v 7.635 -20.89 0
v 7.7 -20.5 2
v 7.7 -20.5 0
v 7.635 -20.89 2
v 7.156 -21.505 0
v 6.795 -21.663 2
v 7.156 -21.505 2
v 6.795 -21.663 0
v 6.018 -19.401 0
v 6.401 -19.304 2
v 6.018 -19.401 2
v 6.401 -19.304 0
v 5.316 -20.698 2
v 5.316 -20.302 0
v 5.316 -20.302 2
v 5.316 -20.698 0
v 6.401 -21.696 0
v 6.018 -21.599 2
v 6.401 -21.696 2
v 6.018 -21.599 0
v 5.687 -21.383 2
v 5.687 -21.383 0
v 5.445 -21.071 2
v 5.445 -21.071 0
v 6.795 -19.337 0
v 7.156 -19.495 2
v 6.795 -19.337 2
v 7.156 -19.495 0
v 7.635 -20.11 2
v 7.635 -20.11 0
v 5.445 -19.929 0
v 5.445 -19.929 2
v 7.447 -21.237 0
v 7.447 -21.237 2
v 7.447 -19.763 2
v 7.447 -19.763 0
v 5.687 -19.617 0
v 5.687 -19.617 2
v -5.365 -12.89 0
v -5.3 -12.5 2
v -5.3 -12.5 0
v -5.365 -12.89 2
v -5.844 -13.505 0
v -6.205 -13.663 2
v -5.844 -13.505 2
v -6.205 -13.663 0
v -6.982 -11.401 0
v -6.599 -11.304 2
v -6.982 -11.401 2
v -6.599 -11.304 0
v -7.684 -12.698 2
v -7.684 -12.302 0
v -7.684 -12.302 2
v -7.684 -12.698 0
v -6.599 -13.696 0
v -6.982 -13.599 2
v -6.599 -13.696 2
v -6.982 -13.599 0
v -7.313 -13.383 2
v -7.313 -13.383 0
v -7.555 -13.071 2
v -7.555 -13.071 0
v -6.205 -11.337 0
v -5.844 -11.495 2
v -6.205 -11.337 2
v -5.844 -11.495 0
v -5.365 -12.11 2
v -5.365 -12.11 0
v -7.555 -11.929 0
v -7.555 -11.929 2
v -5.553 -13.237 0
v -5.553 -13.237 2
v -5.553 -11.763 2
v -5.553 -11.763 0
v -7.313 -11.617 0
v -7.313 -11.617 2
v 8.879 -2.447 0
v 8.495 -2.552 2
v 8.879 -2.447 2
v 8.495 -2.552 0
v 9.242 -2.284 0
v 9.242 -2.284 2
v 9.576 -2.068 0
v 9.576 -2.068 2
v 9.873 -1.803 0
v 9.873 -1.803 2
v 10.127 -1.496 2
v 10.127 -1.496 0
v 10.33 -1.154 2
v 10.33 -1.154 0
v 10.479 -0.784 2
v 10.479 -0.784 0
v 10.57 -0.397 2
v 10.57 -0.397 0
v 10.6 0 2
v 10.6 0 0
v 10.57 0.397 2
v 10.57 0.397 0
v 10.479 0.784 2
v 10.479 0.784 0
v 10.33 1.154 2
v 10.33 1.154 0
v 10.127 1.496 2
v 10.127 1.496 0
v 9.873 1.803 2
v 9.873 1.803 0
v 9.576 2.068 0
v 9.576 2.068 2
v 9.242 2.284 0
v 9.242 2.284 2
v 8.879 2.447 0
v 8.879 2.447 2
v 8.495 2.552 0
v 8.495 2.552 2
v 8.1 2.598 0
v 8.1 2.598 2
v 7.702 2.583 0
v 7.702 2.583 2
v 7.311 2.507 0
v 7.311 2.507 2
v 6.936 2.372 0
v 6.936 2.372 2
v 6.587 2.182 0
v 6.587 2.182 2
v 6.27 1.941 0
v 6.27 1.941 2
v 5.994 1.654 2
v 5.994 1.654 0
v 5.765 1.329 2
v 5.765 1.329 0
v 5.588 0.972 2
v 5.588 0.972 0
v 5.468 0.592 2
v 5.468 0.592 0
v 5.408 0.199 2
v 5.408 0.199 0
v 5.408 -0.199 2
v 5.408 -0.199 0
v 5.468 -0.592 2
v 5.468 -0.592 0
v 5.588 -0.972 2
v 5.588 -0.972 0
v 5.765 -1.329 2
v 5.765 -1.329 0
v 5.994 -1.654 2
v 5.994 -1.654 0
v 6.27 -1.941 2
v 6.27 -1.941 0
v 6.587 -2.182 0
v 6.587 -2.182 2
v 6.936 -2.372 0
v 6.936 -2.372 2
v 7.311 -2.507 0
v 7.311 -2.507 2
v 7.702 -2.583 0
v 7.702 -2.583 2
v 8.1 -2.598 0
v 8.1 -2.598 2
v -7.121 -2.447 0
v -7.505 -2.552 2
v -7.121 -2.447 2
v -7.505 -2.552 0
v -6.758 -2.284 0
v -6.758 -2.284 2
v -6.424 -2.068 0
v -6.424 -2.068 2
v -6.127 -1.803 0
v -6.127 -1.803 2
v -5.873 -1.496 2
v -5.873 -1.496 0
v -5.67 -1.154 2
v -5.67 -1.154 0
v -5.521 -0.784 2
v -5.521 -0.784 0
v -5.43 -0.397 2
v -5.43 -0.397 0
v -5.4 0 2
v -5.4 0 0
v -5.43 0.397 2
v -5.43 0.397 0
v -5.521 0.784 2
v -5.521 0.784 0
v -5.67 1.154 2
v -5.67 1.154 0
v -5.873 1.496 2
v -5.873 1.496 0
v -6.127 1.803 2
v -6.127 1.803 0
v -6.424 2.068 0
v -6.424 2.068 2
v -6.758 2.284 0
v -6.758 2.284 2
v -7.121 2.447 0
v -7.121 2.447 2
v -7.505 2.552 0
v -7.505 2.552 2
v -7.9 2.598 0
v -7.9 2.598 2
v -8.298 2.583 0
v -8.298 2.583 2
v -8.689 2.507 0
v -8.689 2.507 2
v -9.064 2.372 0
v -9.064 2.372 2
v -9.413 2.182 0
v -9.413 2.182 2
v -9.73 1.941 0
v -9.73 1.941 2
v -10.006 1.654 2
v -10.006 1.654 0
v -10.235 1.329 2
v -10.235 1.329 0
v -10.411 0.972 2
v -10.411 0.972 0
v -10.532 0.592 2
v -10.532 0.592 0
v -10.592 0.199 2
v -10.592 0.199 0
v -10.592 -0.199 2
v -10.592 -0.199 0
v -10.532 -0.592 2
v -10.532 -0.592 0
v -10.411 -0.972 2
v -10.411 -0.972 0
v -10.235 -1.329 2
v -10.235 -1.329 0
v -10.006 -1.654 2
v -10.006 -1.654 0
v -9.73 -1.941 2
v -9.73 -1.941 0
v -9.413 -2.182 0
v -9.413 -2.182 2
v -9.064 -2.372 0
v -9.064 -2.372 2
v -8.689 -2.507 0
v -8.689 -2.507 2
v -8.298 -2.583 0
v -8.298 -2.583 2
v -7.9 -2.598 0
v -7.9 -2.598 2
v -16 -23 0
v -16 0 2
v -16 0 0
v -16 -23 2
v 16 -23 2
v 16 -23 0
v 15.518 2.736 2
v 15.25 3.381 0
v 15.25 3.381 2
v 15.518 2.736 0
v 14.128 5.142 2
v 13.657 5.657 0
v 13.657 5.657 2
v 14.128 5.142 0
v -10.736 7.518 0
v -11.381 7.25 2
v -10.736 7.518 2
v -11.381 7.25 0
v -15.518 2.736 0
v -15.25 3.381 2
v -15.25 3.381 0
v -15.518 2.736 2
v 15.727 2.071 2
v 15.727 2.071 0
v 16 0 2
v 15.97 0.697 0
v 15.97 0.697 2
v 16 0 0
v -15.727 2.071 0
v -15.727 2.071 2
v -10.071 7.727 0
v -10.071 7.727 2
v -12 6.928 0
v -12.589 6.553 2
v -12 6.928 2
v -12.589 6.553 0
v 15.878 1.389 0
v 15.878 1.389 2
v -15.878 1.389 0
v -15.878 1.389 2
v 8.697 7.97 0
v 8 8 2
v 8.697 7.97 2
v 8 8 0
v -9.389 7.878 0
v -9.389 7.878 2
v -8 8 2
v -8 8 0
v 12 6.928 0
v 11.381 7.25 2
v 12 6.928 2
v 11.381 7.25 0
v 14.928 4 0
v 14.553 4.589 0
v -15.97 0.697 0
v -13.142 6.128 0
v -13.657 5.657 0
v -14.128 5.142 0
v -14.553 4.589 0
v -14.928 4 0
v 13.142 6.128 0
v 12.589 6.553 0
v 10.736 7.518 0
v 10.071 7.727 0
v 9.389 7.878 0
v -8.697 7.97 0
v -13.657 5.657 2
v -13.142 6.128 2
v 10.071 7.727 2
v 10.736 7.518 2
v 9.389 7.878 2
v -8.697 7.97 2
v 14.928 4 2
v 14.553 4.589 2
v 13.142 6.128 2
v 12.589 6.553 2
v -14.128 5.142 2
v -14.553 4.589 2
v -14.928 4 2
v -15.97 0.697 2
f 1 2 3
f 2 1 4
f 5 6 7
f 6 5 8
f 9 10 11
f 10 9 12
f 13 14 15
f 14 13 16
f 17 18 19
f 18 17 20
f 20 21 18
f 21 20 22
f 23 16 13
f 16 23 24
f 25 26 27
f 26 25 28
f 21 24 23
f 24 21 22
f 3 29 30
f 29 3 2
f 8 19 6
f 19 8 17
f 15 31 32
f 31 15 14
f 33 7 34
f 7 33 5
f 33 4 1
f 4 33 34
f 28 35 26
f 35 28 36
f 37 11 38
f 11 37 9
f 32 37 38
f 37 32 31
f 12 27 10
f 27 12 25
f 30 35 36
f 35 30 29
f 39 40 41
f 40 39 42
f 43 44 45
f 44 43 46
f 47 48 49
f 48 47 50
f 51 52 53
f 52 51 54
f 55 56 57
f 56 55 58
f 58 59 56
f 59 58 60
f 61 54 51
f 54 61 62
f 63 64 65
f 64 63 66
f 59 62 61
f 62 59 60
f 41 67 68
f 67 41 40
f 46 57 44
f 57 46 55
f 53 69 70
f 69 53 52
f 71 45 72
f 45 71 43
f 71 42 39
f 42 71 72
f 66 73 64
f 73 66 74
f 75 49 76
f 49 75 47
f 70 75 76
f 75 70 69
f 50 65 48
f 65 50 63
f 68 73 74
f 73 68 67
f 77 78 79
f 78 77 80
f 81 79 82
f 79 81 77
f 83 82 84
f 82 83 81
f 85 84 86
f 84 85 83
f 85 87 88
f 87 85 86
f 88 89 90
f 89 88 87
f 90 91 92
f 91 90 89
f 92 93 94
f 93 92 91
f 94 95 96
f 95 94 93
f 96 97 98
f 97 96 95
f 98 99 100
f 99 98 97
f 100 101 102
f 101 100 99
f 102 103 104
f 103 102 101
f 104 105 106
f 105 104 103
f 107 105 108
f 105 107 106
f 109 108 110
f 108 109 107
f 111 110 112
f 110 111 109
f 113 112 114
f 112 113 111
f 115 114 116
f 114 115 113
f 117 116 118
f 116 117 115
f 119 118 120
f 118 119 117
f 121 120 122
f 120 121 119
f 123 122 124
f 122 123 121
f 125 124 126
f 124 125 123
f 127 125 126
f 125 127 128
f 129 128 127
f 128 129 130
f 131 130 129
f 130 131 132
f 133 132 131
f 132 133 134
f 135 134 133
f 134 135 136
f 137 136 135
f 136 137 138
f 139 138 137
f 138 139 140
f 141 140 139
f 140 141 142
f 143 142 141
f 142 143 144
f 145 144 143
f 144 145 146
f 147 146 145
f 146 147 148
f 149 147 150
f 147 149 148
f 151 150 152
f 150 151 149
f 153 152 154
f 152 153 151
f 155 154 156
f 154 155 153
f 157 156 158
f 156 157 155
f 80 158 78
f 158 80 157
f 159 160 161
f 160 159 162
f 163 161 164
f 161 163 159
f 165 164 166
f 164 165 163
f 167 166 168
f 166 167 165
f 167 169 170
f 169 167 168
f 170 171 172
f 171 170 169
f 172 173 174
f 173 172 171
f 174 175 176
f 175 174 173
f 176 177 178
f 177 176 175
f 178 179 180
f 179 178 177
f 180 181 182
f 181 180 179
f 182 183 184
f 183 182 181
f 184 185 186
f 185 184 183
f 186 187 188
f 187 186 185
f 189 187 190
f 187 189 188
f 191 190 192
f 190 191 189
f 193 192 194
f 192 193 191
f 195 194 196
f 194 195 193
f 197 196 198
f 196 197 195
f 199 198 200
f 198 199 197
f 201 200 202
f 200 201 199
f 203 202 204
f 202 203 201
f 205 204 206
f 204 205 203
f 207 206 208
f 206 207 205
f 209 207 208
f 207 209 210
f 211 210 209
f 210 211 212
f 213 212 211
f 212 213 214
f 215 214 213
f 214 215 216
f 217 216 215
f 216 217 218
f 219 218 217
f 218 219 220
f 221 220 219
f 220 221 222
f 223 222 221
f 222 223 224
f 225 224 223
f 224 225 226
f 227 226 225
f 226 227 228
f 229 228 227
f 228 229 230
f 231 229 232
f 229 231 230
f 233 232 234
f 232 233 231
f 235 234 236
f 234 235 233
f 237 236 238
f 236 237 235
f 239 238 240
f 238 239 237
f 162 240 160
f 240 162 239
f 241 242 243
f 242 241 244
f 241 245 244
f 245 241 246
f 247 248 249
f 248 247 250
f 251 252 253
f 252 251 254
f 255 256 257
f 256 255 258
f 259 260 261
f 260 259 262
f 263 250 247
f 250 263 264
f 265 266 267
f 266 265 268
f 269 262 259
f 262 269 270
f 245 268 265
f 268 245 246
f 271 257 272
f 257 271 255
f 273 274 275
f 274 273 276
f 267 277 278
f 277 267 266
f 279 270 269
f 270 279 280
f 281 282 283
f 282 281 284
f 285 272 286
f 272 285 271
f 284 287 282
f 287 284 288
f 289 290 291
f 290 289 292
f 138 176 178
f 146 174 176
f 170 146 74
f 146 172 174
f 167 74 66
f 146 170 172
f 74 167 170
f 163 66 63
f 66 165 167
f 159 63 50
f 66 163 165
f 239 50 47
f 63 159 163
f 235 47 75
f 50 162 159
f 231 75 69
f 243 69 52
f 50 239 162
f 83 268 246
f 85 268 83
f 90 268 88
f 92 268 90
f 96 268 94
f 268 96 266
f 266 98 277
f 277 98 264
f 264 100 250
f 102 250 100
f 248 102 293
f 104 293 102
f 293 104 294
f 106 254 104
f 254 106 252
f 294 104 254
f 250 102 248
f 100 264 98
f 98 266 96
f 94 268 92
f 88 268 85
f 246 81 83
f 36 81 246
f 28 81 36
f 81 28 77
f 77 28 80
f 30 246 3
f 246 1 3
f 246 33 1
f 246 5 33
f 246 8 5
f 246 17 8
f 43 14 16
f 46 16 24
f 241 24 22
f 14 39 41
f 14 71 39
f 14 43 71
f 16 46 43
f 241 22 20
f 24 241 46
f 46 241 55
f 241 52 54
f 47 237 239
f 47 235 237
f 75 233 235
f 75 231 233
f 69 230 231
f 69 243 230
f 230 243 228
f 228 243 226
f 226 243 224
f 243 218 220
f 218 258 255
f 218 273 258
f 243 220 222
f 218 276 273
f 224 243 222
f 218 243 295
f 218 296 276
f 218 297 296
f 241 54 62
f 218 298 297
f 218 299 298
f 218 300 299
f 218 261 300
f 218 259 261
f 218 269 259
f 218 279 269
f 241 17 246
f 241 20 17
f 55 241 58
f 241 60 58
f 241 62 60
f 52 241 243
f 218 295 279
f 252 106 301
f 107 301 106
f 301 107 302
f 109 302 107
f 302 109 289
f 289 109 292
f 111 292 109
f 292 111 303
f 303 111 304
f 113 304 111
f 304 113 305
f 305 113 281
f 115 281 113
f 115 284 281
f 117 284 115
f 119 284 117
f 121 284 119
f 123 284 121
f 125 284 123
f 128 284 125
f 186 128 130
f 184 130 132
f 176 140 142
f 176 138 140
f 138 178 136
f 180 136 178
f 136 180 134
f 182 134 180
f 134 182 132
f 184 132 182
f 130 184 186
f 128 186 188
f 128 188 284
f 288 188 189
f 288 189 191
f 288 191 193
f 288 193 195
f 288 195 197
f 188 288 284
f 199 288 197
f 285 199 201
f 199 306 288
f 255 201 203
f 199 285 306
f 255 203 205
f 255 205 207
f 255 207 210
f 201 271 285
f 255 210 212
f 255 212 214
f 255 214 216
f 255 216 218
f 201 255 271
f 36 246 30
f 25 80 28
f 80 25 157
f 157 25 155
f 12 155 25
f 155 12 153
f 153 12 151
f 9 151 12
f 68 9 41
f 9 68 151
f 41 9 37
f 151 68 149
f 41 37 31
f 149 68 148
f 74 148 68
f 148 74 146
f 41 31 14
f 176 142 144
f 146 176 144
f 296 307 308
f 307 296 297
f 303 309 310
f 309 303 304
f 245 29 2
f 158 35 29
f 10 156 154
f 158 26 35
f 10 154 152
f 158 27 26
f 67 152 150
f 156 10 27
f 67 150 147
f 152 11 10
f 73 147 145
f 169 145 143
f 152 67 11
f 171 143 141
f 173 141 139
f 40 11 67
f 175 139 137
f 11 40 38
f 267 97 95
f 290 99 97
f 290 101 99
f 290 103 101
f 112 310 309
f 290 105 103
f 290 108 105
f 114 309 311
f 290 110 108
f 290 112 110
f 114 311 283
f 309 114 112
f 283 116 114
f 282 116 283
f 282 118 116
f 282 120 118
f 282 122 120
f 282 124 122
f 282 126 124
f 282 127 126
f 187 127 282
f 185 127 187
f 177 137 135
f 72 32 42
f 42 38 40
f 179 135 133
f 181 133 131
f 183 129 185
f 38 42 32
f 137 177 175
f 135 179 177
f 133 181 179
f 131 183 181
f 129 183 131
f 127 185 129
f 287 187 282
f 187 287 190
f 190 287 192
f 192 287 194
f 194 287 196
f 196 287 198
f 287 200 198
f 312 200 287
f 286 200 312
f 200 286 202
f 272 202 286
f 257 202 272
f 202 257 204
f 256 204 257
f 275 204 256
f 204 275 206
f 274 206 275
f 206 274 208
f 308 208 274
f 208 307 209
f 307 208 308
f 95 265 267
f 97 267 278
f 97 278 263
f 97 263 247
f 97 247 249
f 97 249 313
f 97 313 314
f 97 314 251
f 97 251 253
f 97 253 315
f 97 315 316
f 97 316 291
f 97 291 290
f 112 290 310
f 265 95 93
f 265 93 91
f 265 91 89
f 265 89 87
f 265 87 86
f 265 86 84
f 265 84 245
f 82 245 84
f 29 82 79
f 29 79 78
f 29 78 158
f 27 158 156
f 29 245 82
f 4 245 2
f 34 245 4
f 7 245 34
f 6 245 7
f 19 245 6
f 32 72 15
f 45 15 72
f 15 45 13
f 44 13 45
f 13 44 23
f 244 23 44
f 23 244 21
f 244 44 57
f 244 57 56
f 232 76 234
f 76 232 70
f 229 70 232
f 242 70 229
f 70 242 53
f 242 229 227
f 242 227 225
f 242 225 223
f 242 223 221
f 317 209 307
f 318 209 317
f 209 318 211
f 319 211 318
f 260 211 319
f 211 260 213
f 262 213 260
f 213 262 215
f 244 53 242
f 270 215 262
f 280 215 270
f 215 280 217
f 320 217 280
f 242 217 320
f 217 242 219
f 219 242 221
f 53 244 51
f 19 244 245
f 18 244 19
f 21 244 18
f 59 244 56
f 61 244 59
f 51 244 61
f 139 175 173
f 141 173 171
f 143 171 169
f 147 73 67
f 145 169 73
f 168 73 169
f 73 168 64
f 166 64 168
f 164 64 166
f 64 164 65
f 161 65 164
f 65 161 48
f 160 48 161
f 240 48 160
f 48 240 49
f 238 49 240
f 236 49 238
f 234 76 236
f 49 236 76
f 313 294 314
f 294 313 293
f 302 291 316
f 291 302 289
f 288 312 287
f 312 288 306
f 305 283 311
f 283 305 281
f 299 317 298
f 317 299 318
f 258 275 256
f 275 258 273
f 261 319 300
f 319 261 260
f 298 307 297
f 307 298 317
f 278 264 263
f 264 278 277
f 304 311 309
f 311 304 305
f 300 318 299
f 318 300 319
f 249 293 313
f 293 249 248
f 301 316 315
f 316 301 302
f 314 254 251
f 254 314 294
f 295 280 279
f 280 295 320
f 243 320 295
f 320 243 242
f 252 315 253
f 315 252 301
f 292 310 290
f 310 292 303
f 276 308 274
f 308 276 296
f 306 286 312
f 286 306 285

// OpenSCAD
//$fn=60;
$fa=5;
$fs=.4;

height_frame = 4;
height_switch = 12;

version_2();

module version_2(){
    difference(){
        body_all_v2();
        mounting_holes_v2(/*drill=4.2*/);
    }
}

module version_1(){
    difference(){
        body_all_v1();
        mounting_holes_v1();
    }
}

module body_all_v1(){
    linear_extrude(height=height_frame) hull(){
        translate([0,0,0]) circle(d=18);
        translate([0,-11.5,0]) square(size=[18, 23], center=true);
    }
    
    linear_extrude(height=height_switch) hull(){
        translate([0,-16.5,0]) square(size=[18, 13], center=true);
    }
}

module mounting_holes_v1(){
    translate([0,0,-1]) linear_extrude(height=20) hull(){
        translate([0,2,0]) circle(d=5.2);
        translate([0,-2,0]) circle(d=5.2);
    }

    translate([0,0,-1]) linear_extrude(height=4) hull(){
        translate([0,2,0]) circle(d=8);
        translate([0,-2,0]) circle(d=8);
    }

    translate([0, -16.5, 0]) {
        translate([13/2, -8/2, -1]) linear_extrude(height=height_switch+2) circle(d=2.4);
        translate([-13/2, 8/2, -1]) linear_extrude(height=height_switch+2) circle(d=2.4);

        translate([13/2, -8/2, -1]) linear_extrude(height=height_switch-1) circle(d=4);
        translate([-13/2, 8/2, -1]) linear_extrude(height=height_switch-1) circle(d=4);
    }
}

module body_all_v2(){
    linear_extrude(height=2) hull(){
        translate([8,0,0]) circle(d=16);
        translate([-8,0,0]) circle(d=16);
        translate([0,-11.5,0]) square(size=[32, 23], center=true);
    }
}

module mounting_holes_v2(drill=5.2){
    translate([0,0,-1]) linear_extrude(height=20){
        translate([8,0,0]) circle(d=drill);
        translate([-8,0,0]) circle(d=drill);
    }

    translate([0, -16.5, 0]) {
        translate([13/2, -8/2, -1]) linear_extrude(height=4) circle(d=2.4);
        translate([-13/2, 8/2, -1]) linear_extrude(height=4) circle(d=2.4);
    }    
}
